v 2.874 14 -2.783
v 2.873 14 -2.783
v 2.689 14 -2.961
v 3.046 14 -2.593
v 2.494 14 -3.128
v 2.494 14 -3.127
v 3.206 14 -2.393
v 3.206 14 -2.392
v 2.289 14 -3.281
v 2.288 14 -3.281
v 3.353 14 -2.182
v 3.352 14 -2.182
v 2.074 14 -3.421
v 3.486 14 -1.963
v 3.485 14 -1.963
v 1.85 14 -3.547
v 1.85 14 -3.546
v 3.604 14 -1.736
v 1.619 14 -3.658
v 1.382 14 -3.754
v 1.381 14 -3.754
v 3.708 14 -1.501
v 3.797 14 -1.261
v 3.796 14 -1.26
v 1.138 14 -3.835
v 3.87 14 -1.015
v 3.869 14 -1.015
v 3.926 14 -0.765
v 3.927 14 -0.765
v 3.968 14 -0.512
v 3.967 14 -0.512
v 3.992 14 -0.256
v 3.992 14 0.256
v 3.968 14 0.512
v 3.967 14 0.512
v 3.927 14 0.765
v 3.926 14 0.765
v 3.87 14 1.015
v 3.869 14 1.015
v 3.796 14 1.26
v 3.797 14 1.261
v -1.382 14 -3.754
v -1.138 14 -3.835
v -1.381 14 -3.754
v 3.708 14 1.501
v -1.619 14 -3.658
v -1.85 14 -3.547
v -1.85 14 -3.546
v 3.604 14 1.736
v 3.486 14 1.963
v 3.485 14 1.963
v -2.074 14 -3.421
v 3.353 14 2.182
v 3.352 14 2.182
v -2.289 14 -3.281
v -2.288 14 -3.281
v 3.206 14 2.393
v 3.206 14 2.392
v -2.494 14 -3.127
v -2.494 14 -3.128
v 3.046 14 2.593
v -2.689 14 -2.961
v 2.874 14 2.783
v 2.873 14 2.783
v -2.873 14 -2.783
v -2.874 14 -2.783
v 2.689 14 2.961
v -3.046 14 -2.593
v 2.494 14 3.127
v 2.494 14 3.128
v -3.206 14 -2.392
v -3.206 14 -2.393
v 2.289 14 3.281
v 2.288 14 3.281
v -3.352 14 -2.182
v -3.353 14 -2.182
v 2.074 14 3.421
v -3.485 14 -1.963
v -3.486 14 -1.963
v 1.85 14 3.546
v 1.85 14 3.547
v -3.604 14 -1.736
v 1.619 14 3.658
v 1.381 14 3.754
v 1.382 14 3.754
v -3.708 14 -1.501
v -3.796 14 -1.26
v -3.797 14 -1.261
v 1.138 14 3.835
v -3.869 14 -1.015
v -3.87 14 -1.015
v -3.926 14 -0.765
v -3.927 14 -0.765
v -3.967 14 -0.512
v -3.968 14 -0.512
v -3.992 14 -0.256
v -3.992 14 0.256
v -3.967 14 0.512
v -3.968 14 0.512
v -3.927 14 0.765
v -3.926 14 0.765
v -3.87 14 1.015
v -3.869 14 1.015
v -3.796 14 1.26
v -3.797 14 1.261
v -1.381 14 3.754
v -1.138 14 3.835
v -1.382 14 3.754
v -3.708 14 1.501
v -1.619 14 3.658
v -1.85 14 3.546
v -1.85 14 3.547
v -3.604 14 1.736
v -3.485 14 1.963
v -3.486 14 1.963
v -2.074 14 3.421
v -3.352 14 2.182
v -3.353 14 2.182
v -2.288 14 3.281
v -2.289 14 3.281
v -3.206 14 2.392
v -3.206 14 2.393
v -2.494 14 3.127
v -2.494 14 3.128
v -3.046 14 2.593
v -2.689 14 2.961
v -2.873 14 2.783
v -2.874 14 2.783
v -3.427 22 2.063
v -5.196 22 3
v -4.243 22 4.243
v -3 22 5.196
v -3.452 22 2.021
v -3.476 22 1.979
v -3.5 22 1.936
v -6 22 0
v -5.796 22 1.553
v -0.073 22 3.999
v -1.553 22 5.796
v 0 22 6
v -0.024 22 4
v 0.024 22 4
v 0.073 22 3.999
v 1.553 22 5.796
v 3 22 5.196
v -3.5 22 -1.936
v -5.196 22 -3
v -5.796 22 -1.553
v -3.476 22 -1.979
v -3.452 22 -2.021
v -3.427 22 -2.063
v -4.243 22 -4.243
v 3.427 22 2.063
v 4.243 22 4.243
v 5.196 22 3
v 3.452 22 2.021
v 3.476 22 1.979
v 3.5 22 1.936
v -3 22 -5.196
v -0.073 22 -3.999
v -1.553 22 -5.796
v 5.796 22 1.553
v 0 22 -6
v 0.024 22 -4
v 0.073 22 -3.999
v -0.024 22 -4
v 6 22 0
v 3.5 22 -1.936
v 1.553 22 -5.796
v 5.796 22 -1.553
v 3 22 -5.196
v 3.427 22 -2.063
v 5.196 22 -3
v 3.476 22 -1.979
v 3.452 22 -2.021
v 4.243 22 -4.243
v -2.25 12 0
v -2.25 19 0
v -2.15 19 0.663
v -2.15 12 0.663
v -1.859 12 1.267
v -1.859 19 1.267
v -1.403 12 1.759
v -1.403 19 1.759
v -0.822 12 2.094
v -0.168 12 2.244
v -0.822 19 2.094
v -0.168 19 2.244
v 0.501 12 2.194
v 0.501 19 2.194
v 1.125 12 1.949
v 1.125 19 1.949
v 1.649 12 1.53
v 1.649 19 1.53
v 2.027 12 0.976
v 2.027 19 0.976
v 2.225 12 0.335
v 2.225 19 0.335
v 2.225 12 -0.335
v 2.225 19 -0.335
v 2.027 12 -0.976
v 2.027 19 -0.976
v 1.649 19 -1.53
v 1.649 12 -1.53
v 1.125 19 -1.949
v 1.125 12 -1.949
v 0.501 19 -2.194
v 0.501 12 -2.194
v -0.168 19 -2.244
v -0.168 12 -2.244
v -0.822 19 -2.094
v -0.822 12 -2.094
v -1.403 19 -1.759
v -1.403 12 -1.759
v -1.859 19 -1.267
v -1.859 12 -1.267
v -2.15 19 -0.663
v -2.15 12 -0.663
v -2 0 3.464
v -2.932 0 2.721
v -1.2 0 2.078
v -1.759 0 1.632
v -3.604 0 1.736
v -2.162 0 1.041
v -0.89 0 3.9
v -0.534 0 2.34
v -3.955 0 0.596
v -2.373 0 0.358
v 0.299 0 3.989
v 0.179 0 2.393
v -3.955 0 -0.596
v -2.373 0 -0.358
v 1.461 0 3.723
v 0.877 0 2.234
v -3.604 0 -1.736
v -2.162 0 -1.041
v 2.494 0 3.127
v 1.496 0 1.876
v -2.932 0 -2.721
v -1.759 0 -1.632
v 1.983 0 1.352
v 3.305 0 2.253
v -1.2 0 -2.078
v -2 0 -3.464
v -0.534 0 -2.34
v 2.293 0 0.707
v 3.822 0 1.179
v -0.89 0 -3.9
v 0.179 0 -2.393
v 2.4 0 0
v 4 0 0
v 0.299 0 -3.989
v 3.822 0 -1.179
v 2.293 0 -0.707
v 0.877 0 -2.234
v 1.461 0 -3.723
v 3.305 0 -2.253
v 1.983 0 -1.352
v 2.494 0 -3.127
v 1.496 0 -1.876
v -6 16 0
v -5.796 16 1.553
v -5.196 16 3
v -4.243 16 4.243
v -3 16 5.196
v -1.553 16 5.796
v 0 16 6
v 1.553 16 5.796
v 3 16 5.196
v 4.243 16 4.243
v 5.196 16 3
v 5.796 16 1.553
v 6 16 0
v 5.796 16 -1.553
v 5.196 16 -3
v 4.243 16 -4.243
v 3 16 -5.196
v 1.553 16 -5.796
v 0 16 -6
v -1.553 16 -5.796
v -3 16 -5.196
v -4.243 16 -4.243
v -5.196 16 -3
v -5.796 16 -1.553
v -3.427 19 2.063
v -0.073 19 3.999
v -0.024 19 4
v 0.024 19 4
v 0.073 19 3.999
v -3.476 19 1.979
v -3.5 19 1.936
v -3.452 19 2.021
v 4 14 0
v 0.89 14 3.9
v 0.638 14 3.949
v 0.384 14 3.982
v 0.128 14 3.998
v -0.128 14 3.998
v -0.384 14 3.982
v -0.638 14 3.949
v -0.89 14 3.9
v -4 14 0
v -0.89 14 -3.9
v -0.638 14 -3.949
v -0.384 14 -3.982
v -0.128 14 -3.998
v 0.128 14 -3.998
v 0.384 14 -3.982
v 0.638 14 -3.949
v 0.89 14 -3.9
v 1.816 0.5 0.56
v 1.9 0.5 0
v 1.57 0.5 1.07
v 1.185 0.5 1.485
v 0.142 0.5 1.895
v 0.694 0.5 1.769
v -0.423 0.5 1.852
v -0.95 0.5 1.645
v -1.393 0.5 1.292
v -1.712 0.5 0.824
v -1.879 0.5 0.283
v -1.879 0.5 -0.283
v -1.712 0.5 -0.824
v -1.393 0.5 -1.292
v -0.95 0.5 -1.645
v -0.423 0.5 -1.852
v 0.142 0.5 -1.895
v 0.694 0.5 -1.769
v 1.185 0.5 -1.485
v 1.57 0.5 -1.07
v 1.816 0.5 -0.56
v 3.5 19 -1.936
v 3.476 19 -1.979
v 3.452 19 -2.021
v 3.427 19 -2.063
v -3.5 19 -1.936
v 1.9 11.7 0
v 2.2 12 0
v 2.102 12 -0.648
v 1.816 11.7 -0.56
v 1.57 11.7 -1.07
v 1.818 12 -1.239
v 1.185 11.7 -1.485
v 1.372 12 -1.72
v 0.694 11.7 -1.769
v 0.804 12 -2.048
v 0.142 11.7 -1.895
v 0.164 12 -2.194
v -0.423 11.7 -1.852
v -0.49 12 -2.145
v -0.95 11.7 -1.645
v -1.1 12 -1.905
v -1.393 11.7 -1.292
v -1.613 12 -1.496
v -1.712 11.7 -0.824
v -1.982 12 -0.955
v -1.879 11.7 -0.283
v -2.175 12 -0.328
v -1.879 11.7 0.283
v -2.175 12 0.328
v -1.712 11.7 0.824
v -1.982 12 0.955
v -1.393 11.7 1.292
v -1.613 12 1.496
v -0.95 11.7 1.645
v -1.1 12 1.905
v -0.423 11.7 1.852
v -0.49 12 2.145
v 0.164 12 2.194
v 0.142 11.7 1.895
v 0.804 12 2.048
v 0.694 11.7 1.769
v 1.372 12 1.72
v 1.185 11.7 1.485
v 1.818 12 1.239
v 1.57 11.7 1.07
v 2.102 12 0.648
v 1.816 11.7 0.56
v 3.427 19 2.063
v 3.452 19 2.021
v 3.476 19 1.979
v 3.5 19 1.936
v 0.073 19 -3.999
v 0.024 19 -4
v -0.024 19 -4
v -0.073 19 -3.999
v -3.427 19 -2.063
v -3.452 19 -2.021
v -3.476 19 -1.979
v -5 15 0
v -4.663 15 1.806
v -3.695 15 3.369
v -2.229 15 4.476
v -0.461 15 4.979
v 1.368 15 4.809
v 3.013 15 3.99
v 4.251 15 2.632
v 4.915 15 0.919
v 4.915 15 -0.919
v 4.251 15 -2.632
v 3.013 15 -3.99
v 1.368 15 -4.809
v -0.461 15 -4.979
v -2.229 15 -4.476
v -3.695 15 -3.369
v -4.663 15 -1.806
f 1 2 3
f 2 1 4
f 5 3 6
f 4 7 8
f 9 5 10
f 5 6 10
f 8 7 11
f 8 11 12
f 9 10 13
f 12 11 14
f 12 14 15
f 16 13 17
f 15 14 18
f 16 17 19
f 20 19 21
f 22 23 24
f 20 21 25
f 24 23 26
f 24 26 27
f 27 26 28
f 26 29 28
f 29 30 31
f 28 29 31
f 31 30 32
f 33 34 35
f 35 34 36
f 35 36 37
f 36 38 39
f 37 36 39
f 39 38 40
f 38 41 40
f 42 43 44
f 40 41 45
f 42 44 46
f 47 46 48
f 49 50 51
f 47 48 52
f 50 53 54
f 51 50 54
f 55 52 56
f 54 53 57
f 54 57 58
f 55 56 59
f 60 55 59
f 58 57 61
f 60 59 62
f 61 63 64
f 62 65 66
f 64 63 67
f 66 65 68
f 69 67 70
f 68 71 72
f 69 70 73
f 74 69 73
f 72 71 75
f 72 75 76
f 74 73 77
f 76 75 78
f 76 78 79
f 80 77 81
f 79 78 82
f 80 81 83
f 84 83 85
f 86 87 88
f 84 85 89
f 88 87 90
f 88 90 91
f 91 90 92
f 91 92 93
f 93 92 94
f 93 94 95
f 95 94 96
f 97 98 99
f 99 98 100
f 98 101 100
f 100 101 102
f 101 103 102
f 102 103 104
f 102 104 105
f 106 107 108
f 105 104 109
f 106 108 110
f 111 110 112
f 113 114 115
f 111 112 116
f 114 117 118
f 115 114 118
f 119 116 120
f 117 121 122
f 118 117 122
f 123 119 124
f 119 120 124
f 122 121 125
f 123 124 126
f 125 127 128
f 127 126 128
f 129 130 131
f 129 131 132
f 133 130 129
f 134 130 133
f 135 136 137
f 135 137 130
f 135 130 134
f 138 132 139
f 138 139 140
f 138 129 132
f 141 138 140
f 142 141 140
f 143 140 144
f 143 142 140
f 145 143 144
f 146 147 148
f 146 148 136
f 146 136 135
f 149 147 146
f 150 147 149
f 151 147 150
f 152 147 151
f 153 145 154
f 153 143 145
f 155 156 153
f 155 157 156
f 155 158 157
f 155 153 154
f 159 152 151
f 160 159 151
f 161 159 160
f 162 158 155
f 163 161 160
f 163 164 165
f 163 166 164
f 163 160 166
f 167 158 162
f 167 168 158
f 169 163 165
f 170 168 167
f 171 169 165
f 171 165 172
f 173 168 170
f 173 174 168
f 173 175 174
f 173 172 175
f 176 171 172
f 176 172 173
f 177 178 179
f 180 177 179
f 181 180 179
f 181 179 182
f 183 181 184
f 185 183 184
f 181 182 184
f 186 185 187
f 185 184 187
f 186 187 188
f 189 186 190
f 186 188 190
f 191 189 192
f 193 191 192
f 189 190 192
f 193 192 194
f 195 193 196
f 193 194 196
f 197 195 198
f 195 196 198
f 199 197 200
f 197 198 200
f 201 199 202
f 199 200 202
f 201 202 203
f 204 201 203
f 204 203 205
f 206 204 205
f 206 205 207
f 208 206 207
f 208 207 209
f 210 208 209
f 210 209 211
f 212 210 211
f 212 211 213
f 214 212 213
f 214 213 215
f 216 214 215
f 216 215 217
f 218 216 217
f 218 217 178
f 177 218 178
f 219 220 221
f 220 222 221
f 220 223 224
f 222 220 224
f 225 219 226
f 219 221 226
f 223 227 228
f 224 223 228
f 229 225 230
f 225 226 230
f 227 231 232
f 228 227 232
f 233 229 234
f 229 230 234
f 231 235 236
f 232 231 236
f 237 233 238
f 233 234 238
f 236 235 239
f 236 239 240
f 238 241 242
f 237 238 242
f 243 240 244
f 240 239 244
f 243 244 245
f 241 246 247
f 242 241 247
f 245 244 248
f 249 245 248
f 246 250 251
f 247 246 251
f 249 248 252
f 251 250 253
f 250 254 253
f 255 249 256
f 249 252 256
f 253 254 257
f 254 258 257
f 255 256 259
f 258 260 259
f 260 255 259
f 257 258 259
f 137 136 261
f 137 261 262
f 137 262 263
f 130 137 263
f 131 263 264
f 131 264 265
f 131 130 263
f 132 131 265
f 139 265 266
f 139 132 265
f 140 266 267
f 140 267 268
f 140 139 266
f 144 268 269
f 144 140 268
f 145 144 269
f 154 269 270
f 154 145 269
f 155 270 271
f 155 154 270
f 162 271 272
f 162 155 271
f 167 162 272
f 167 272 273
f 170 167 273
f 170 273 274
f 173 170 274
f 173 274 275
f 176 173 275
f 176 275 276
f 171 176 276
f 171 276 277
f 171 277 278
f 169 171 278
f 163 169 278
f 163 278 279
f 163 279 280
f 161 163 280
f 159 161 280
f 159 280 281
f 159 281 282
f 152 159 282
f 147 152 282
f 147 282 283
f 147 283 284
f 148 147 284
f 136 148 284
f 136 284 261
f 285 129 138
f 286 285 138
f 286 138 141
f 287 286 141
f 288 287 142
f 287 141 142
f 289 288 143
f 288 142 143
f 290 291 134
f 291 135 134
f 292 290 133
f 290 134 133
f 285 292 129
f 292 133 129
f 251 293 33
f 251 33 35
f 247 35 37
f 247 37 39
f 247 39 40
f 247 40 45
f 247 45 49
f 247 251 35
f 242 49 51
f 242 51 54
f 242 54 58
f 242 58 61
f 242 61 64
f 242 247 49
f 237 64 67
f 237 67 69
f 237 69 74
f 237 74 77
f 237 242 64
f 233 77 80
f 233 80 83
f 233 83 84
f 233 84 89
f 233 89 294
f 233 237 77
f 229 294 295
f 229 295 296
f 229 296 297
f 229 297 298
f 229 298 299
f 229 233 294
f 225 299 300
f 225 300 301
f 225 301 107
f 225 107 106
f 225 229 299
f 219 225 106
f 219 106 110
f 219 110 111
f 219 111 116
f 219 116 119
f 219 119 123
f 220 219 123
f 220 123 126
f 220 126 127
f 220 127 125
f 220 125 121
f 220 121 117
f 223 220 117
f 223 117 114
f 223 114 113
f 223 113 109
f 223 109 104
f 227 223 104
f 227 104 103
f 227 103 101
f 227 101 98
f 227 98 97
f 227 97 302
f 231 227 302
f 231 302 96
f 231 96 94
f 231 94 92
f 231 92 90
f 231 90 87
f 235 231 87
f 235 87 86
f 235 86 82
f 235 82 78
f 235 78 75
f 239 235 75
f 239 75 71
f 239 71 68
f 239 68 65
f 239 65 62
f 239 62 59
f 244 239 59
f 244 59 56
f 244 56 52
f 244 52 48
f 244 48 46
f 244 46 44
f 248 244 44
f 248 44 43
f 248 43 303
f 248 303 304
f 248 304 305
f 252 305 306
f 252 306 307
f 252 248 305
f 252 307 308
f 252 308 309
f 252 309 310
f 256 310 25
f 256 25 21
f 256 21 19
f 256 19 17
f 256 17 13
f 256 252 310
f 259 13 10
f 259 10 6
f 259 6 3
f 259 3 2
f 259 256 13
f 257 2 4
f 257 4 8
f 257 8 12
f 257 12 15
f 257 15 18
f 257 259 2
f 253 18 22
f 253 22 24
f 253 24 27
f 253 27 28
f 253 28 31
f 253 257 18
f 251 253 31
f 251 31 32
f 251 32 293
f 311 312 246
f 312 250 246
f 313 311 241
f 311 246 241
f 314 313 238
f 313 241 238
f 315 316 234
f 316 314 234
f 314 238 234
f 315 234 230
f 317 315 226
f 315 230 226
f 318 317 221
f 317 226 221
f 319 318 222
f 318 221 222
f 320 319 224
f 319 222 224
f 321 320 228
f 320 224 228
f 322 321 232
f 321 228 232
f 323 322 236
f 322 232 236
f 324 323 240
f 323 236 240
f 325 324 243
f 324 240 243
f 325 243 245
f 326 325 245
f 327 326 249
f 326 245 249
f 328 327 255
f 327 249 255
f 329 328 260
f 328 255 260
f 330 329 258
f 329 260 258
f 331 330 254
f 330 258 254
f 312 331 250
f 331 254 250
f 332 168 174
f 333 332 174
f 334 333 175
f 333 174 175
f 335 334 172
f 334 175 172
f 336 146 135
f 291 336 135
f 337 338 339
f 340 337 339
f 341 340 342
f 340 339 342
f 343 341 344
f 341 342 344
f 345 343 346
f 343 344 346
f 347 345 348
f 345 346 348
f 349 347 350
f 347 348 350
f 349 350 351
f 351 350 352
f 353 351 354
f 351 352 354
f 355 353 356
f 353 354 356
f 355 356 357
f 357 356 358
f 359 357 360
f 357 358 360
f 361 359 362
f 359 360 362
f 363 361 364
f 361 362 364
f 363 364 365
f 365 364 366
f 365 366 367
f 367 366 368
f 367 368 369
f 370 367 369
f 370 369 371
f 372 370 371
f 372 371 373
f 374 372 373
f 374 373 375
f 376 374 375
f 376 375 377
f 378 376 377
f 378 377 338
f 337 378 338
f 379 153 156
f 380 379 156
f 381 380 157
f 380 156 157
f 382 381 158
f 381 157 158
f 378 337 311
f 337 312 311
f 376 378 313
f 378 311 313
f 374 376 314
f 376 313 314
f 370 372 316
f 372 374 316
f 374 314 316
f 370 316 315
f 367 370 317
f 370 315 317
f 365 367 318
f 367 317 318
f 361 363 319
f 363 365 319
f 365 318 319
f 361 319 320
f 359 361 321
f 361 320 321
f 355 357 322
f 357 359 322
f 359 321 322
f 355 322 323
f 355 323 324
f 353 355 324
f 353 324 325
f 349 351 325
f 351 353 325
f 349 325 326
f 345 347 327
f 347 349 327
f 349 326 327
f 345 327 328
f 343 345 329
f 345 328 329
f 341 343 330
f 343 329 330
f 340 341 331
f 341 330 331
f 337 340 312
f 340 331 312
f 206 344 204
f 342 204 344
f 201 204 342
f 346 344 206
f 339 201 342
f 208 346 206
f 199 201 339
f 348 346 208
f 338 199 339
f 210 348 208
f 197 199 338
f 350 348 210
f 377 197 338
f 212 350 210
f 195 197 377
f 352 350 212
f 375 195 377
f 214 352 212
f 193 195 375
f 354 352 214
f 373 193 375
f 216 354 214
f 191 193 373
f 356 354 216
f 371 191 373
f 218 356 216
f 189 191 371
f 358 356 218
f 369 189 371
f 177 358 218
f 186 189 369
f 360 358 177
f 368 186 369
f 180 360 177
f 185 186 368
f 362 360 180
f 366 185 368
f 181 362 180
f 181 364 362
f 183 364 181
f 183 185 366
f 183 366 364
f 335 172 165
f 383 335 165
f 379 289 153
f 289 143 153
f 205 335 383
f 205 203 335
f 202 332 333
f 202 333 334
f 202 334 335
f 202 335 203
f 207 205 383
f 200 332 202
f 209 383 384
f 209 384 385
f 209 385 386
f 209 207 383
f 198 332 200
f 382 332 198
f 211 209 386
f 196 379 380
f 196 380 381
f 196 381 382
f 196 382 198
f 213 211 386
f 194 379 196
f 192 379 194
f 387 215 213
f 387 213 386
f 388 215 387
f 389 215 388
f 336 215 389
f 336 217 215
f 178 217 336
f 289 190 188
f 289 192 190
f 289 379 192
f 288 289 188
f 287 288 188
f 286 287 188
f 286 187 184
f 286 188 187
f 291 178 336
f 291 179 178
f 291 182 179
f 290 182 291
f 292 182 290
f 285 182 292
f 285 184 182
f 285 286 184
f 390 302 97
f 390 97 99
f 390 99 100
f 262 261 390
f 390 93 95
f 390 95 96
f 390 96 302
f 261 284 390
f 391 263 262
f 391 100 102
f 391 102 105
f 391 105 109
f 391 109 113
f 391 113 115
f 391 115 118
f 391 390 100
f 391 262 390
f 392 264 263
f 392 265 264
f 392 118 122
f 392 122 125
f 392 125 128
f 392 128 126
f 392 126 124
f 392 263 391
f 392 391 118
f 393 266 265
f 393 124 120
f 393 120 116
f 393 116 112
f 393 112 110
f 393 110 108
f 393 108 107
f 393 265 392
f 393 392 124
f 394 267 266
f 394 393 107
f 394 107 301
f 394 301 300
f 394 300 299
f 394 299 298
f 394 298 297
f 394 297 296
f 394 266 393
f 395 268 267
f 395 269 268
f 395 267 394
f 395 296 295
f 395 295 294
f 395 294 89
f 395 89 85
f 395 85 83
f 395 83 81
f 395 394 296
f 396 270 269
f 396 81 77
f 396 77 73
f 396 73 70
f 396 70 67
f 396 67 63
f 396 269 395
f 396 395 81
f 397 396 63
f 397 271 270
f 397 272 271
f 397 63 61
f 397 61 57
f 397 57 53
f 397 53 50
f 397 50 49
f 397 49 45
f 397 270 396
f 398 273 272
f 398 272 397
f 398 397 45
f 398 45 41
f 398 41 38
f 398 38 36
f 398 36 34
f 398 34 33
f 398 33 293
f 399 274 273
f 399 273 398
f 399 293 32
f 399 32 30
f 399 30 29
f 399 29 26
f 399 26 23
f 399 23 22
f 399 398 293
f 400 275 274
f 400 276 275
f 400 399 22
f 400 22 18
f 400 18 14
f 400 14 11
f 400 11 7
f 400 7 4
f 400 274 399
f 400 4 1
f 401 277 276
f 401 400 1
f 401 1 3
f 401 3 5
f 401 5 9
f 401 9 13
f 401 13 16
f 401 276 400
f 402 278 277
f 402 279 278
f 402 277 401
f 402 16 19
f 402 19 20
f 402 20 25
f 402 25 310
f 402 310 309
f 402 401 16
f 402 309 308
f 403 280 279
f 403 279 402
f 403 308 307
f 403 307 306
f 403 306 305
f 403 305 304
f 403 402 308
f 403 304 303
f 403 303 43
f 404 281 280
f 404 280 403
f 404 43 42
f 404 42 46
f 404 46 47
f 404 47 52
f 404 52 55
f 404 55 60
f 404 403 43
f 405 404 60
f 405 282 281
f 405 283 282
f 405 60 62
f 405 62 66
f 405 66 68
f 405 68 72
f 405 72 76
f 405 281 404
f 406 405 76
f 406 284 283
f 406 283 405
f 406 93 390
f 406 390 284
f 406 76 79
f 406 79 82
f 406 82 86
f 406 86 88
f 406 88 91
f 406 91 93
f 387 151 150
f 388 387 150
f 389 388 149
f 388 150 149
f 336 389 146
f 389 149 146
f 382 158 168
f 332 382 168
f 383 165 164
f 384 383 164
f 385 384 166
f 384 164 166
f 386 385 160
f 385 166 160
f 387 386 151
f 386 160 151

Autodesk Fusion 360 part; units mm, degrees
sketch "Sketch1" plane through (0, 0, 0) normal (0, 1, 0) x (1, 0, 0)
  circle A0 centre (0, 0) radius 1.9
  circle A1 centre (0, 0) radius 4
  dimension "d1" = 3.8
  dimension "d2" = 8
extrude "Extrude1" add sketch "Sketch1" along normal blind 22
chamfer "Chamfer2" distance 0.5 angle 45 1 edges at (-1.7714, 0, -0.6871)
sketch "Sketch2" plane through (0, 22, 0) normal (0, 1, 0) x (-1, 0, 0)
  circle A0 centre (0, 0) radius 1.9
  circle A1 centre (0, 0) radius 4
  circle A2 centre (0, 0) radius 6
  line L0 (3.5, 2.0207) -> (0, 4.0415)
  line L1 (0, 4.0415) -> (-3.5, 2.0207)
  line L2 (-3.5, 2.0207) -> (-3.5, -2.0207)
  line L3 (-3.5, -2.0207) -> (0, -4.0415)
  line L4 (0, -4.0415) -> (3.5, -2.0207)
  line L5 (3.5, -2.0207) -> (3.5, 2.0207)
  circle A3 centre (0, 0) radius 2.25
  dimension "d7" = 12
  dimension "d8" = 3.5
  dimension "d9" = 4.5
extrude "Extrude3" cut sketch "Sketch2" against normal blind 3 contours A1 L0 L1 L2 L3 L4 L5 | A3
extrude "Extrude2" add sketch "Sketch2" against normal blind 8 contours A1 L0 L5 | A1 L4 L5 | A1 L0 L1 | A1 L3 L4 | A1 L1 L2 | A1 L2 L3 | A2
extrude "Extrude4" cut sketch "Sketch2" against normal blind 10 contours A3
chamfer "Chamfer3" distance 2 angle 45 1 edges at (5.594, 14, 2.1697)
chamfer "Chamfer4" distance 0.3 angle 45 1 edges at (-1.7714, 12, 0.6871)
